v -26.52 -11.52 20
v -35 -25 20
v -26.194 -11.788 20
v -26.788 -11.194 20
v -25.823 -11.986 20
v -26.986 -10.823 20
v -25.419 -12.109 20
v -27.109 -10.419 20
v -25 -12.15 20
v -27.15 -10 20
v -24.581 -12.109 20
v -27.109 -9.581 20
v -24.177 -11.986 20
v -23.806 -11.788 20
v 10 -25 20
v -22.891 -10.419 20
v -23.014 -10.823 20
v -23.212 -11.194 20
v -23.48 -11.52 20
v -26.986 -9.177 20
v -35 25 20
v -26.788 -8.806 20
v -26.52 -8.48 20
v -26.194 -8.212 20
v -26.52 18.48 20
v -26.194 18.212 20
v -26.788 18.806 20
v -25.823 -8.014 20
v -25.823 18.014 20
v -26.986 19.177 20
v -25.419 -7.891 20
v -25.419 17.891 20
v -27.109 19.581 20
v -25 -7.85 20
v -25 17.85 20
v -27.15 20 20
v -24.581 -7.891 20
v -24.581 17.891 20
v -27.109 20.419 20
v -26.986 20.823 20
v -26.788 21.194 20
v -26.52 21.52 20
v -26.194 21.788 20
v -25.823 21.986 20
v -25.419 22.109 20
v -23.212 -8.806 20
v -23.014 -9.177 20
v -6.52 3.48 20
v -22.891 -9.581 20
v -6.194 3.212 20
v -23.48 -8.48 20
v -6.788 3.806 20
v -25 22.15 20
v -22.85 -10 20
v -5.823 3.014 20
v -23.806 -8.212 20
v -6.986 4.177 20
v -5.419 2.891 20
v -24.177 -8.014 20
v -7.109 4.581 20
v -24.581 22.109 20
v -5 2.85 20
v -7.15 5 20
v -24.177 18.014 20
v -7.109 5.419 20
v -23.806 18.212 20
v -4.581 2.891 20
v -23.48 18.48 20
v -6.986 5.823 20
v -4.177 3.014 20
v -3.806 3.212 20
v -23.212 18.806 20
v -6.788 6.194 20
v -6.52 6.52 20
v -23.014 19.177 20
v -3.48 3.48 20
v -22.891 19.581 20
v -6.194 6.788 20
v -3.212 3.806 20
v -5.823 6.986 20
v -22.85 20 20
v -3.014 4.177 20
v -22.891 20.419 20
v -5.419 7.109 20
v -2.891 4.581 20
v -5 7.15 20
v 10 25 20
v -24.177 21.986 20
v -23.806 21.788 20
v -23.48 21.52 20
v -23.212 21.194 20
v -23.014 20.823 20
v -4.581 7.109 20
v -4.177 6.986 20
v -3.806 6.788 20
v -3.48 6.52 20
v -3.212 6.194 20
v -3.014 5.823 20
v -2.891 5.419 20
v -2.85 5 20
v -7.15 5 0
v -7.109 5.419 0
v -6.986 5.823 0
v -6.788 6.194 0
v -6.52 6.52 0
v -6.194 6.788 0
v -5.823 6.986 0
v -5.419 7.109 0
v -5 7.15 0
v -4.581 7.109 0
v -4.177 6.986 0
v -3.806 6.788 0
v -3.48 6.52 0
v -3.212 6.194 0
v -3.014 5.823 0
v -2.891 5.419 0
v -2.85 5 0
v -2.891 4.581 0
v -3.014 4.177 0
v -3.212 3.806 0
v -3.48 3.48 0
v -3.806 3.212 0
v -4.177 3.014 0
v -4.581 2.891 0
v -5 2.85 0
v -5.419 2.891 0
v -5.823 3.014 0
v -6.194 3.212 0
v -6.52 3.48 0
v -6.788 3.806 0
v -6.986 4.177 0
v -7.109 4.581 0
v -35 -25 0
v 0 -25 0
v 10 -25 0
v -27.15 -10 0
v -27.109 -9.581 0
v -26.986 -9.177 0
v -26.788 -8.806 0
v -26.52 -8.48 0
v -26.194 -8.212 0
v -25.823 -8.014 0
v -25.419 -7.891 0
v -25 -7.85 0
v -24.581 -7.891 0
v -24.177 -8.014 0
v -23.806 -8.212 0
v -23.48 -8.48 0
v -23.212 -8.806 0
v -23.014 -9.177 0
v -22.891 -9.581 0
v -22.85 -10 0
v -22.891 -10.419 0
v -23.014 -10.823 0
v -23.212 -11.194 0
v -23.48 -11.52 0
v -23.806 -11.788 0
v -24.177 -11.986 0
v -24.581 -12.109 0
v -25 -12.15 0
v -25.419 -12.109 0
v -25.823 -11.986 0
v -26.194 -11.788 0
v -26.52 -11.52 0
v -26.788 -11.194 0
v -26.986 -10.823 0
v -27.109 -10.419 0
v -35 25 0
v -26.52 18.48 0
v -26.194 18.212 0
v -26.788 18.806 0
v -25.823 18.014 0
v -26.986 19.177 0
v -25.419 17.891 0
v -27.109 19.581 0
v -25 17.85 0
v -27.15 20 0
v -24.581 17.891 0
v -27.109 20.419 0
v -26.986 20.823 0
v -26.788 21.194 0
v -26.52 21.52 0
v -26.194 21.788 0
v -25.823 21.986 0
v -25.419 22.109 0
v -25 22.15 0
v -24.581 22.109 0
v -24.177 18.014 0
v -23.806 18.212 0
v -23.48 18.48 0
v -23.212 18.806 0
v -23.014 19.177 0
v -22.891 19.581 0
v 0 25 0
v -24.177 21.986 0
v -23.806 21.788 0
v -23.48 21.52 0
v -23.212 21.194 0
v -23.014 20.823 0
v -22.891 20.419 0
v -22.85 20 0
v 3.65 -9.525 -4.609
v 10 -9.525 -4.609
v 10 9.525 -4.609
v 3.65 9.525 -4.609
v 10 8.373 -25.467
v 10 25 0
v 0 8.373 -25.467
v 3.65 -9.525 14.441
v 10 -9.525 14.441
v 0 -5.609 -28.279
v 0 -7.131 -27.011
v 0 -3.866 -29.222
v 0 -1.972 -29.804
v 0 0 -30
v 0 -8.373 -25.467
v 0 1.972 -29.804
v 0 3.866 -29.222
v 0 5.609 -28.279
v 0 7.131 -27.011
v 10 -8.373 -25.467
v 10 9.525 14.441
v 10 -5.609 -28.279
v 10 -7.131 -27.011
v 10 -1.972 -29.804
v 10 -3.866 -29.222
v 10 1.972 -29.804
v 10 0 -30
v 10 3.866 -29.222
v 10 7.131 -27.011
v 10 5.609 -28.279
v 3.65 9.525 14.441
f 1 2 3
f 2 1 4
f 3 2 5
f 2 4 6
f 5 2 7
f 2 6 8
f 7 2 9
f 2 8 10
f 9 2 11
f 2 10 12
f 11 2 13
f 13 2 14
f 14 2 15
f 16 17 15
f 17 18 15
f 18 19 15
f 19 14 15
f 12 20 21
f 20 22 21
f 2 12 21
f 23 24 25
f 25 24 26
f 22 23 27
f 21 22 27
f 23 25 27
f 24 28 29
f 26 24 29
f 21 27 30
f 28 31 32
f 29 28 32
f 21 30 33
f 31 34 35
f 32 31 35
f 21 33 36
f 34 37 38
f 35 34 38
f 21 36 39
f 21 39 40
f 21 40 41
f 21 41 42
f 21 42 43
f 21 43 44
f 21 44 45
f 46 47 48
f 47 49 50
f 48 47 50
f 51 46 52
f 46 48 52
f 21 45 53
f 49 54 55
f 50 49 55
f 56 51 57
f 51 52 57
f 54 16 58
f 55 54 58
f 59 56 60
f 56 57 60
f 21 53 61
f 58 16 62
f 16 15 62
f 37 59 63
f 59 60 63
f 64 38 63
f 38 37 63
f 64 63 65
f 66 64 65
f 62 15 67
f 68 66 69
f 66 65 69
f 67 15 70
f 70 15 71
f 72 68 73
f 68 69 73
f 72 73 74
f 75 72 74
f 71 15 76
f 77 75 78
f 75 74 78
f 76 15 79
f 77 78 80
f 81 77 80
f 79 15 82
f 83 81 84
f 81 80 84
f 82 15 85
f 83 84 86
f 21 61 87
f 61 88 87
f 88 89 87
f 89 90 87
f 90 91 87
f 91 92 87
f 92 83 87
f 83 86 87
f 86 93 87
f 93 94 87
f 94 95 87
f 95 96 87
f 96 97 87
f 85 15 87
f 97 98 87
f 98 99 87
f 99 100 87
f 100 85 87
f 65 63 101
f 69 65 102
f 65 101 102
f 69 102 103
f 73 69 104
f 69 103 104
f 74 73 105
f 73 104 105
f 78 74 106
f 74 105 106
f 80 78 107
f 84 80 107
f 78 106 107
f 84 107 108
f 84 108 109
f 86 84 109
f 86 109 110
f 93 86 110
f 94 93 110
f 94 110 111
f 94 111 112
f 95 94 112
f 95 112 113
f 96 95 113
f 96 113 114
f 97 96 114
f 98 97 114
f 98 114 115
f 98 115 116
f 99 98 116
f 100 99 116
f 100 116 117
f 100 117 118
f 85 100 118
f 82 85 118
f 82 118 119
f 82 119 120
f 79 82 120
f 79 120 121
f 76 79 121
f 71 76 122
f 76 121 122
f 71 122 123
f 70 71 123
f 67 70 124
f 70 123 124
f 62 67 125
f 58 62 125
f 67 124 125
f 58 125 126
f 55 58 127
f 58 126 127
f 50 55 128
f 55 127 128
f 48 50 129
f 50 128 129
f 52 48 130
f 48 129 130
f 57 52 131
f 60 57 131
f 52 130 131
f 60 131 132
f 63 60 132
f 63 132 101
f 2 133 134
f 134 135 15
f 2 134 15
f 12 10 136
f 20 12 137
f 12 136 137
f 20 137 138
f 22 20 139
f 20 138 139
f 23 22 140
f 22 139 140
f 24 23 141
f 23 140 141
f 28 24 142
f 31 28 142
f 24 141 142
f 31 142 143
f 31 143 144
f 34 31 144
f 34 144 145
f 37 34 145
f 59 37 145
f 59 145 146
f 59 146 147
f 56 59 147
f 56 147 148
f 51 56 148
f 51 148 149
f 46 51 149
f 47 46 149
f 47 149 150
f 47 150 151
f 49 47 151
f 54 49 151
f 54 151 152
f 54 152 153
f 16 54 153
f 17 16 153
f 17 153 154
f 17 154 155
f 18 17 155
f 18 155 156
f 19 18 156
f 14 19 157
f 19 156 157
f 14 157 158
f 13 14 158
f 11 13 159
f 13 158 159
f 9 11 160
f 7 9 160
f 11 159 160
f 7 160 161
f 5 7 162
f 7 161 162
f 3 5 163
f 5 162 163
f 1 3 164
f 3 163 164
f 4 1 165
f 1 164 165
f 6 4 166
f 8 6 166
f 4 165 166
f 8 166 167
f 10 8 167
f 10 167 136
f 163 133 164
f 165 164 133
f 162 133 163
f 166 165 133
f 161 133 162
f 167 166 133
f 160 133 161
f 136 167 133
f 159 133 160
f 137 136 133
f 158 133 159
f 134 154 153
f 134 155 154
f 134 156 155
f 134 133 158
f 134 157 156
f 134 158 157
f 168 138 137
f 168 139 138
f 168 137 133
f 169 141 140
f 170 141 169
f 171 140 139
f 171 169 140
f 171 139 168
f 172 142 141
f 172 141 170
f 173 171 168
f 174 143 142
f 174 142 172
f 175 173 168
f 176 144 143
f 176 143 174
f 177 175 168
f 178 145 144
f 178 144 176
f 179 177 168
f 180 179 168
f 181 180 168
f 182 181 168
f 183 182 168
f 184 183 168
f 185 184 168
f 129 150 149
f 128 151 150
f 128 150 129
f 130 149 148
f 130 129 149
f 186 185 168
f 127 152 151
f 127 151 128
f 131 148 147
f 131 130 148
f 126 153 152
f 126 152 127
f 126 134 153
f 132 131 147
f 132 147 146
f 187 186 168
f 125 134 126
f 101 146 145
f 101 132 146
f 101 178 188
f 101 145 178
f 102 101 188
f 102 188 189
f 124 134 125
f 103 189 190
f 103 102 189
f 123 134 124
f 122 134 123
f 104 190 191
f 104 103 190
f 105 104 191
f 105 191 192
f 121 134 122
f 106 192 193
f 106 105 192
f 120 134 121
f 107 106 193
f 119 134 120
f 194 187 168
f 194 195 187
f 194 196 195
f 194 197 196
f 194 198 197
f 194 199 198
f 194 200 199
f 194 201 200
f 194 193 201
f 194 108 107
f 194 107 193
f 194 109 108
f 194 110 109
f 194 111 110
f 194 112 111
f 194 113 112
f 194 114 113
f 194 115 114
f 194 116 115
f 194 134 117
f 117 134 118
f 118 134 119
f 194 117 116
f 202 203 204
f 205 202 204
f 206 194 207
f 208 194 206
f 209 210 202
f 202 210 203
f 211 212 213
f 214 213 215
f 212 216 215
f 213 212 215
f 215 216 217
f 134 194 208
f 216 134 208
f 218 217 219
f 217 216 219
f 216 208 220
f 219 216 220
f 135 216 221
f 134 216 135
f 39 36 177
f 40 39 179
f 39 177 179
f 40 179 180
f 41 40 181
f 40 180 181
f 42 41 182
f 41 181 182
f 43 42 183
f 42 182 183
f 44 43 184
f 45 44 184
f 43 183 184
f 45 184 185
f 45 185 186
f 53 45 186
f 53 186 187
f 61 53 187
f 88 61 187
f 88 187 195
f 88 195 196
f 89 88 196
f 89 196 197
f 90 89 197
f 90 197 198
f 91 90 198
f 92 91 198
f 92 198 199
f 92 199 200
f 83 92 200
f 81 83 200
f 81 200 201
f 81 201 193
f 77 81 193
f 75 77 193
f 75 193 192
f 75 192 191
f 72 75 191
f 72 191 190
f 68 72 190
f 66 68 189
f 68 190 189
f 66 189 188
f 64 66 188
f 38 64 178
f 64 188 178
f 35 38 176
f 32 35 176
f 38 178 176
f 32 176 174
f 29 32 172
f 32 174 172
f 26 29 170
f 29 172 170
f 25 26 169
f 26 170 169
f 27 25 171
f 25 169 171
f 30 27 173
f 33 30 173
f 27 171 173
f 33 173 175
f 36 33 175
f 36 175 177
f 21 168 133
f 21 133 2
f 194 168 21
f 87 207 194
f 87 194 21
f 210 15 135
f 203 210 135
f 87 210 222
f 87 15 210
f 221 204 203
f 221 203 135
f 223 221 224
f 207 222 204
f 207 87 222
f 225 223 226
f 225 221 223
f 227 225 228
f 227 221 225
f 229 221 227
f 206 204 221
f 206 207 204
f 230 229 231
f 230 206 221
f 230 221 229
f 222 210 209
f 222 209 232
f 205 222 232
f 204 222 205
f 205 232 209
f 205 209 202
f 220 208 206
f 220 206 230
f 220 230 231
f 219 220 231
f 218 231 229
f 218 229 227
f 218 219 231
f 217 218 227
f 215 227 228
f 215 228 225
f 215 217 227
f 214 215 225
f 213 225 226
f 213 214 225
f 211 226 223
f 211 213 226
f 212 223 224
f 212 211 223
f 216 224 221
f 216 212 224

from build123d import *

# Parameters (mm, degrees)
SKETCH1_W            = 20
SKETCH1_H            = 50
BOSS_EXTRUDE1_DEPTH  = 10
SKETCH5_W            = 19.05
SKETCH5_H            = 19.05
CUT_EXTRUDE1_DEPTH   = 6.35
SKETCH7_W            = 20
SKETCH7_H            = 50
BOSS_EXTRUDE2_DEPTH  = 35
M4_CLEARANCE_HOLE1_D = 4.3


with BuildPart() as part:
    # Sketch1 → Boss-Extrude1 (new body)
    with BuildSketch(Plane(origin=(0, 0, 0), x_dir=(0, 0, -1), z_dir=(1, 0, 0))):
        with Locations((-10, 0)):
            Rectangle(SKETCH1_W, SKETCH1_H)
        with BuildLine():
            ThreePointArc((25.466783574, 8.373426859), (30, 0), (25.466783574, -8.373426859))
            Line((25.466783574, -8.373426859), (0, -25))
            Line((0, -25), (0, 25))
            Line((0, 25), (25.466783574, 8.373426859))
        make_face()
    extrude(amount=BOSS_EXTRUDE1_DEPTH)

    # Sketch5 → Cut-Extrude1 (cut)
    with BuildSketch(Plane(origin=(10, 0, 0), x_dir=(0, 0, -1), z_dir=(1, 0, 0))):
        with Locations((-4.915565879, 0)):
            Rectangle(SKETCH5_W, SKETCH5_H)
    extrude(amount=-CUT_EXTRUDE1_DEPTH, mode=Mode.SUBTRACT)

    # Sketch7 → Boss-Extrude2 (add)
    with BuildSketch(Plane.ZY):
        with Locations((10, 0)):
            Rectangle(SKETCH7_W, SKETCH7_H)
    extrude(amount=BOSS_EXTRUDE2_DEPTH)

    # M4 Clearance Hole1 (through all)
    with Locations(Plane.XY.offset(20)):
        with Locations((-25, 20), (-25, -10), (-5, 5)):
            Hole(M4_CLEARANCE_HOLE1_D / 2)


solid = part.part
